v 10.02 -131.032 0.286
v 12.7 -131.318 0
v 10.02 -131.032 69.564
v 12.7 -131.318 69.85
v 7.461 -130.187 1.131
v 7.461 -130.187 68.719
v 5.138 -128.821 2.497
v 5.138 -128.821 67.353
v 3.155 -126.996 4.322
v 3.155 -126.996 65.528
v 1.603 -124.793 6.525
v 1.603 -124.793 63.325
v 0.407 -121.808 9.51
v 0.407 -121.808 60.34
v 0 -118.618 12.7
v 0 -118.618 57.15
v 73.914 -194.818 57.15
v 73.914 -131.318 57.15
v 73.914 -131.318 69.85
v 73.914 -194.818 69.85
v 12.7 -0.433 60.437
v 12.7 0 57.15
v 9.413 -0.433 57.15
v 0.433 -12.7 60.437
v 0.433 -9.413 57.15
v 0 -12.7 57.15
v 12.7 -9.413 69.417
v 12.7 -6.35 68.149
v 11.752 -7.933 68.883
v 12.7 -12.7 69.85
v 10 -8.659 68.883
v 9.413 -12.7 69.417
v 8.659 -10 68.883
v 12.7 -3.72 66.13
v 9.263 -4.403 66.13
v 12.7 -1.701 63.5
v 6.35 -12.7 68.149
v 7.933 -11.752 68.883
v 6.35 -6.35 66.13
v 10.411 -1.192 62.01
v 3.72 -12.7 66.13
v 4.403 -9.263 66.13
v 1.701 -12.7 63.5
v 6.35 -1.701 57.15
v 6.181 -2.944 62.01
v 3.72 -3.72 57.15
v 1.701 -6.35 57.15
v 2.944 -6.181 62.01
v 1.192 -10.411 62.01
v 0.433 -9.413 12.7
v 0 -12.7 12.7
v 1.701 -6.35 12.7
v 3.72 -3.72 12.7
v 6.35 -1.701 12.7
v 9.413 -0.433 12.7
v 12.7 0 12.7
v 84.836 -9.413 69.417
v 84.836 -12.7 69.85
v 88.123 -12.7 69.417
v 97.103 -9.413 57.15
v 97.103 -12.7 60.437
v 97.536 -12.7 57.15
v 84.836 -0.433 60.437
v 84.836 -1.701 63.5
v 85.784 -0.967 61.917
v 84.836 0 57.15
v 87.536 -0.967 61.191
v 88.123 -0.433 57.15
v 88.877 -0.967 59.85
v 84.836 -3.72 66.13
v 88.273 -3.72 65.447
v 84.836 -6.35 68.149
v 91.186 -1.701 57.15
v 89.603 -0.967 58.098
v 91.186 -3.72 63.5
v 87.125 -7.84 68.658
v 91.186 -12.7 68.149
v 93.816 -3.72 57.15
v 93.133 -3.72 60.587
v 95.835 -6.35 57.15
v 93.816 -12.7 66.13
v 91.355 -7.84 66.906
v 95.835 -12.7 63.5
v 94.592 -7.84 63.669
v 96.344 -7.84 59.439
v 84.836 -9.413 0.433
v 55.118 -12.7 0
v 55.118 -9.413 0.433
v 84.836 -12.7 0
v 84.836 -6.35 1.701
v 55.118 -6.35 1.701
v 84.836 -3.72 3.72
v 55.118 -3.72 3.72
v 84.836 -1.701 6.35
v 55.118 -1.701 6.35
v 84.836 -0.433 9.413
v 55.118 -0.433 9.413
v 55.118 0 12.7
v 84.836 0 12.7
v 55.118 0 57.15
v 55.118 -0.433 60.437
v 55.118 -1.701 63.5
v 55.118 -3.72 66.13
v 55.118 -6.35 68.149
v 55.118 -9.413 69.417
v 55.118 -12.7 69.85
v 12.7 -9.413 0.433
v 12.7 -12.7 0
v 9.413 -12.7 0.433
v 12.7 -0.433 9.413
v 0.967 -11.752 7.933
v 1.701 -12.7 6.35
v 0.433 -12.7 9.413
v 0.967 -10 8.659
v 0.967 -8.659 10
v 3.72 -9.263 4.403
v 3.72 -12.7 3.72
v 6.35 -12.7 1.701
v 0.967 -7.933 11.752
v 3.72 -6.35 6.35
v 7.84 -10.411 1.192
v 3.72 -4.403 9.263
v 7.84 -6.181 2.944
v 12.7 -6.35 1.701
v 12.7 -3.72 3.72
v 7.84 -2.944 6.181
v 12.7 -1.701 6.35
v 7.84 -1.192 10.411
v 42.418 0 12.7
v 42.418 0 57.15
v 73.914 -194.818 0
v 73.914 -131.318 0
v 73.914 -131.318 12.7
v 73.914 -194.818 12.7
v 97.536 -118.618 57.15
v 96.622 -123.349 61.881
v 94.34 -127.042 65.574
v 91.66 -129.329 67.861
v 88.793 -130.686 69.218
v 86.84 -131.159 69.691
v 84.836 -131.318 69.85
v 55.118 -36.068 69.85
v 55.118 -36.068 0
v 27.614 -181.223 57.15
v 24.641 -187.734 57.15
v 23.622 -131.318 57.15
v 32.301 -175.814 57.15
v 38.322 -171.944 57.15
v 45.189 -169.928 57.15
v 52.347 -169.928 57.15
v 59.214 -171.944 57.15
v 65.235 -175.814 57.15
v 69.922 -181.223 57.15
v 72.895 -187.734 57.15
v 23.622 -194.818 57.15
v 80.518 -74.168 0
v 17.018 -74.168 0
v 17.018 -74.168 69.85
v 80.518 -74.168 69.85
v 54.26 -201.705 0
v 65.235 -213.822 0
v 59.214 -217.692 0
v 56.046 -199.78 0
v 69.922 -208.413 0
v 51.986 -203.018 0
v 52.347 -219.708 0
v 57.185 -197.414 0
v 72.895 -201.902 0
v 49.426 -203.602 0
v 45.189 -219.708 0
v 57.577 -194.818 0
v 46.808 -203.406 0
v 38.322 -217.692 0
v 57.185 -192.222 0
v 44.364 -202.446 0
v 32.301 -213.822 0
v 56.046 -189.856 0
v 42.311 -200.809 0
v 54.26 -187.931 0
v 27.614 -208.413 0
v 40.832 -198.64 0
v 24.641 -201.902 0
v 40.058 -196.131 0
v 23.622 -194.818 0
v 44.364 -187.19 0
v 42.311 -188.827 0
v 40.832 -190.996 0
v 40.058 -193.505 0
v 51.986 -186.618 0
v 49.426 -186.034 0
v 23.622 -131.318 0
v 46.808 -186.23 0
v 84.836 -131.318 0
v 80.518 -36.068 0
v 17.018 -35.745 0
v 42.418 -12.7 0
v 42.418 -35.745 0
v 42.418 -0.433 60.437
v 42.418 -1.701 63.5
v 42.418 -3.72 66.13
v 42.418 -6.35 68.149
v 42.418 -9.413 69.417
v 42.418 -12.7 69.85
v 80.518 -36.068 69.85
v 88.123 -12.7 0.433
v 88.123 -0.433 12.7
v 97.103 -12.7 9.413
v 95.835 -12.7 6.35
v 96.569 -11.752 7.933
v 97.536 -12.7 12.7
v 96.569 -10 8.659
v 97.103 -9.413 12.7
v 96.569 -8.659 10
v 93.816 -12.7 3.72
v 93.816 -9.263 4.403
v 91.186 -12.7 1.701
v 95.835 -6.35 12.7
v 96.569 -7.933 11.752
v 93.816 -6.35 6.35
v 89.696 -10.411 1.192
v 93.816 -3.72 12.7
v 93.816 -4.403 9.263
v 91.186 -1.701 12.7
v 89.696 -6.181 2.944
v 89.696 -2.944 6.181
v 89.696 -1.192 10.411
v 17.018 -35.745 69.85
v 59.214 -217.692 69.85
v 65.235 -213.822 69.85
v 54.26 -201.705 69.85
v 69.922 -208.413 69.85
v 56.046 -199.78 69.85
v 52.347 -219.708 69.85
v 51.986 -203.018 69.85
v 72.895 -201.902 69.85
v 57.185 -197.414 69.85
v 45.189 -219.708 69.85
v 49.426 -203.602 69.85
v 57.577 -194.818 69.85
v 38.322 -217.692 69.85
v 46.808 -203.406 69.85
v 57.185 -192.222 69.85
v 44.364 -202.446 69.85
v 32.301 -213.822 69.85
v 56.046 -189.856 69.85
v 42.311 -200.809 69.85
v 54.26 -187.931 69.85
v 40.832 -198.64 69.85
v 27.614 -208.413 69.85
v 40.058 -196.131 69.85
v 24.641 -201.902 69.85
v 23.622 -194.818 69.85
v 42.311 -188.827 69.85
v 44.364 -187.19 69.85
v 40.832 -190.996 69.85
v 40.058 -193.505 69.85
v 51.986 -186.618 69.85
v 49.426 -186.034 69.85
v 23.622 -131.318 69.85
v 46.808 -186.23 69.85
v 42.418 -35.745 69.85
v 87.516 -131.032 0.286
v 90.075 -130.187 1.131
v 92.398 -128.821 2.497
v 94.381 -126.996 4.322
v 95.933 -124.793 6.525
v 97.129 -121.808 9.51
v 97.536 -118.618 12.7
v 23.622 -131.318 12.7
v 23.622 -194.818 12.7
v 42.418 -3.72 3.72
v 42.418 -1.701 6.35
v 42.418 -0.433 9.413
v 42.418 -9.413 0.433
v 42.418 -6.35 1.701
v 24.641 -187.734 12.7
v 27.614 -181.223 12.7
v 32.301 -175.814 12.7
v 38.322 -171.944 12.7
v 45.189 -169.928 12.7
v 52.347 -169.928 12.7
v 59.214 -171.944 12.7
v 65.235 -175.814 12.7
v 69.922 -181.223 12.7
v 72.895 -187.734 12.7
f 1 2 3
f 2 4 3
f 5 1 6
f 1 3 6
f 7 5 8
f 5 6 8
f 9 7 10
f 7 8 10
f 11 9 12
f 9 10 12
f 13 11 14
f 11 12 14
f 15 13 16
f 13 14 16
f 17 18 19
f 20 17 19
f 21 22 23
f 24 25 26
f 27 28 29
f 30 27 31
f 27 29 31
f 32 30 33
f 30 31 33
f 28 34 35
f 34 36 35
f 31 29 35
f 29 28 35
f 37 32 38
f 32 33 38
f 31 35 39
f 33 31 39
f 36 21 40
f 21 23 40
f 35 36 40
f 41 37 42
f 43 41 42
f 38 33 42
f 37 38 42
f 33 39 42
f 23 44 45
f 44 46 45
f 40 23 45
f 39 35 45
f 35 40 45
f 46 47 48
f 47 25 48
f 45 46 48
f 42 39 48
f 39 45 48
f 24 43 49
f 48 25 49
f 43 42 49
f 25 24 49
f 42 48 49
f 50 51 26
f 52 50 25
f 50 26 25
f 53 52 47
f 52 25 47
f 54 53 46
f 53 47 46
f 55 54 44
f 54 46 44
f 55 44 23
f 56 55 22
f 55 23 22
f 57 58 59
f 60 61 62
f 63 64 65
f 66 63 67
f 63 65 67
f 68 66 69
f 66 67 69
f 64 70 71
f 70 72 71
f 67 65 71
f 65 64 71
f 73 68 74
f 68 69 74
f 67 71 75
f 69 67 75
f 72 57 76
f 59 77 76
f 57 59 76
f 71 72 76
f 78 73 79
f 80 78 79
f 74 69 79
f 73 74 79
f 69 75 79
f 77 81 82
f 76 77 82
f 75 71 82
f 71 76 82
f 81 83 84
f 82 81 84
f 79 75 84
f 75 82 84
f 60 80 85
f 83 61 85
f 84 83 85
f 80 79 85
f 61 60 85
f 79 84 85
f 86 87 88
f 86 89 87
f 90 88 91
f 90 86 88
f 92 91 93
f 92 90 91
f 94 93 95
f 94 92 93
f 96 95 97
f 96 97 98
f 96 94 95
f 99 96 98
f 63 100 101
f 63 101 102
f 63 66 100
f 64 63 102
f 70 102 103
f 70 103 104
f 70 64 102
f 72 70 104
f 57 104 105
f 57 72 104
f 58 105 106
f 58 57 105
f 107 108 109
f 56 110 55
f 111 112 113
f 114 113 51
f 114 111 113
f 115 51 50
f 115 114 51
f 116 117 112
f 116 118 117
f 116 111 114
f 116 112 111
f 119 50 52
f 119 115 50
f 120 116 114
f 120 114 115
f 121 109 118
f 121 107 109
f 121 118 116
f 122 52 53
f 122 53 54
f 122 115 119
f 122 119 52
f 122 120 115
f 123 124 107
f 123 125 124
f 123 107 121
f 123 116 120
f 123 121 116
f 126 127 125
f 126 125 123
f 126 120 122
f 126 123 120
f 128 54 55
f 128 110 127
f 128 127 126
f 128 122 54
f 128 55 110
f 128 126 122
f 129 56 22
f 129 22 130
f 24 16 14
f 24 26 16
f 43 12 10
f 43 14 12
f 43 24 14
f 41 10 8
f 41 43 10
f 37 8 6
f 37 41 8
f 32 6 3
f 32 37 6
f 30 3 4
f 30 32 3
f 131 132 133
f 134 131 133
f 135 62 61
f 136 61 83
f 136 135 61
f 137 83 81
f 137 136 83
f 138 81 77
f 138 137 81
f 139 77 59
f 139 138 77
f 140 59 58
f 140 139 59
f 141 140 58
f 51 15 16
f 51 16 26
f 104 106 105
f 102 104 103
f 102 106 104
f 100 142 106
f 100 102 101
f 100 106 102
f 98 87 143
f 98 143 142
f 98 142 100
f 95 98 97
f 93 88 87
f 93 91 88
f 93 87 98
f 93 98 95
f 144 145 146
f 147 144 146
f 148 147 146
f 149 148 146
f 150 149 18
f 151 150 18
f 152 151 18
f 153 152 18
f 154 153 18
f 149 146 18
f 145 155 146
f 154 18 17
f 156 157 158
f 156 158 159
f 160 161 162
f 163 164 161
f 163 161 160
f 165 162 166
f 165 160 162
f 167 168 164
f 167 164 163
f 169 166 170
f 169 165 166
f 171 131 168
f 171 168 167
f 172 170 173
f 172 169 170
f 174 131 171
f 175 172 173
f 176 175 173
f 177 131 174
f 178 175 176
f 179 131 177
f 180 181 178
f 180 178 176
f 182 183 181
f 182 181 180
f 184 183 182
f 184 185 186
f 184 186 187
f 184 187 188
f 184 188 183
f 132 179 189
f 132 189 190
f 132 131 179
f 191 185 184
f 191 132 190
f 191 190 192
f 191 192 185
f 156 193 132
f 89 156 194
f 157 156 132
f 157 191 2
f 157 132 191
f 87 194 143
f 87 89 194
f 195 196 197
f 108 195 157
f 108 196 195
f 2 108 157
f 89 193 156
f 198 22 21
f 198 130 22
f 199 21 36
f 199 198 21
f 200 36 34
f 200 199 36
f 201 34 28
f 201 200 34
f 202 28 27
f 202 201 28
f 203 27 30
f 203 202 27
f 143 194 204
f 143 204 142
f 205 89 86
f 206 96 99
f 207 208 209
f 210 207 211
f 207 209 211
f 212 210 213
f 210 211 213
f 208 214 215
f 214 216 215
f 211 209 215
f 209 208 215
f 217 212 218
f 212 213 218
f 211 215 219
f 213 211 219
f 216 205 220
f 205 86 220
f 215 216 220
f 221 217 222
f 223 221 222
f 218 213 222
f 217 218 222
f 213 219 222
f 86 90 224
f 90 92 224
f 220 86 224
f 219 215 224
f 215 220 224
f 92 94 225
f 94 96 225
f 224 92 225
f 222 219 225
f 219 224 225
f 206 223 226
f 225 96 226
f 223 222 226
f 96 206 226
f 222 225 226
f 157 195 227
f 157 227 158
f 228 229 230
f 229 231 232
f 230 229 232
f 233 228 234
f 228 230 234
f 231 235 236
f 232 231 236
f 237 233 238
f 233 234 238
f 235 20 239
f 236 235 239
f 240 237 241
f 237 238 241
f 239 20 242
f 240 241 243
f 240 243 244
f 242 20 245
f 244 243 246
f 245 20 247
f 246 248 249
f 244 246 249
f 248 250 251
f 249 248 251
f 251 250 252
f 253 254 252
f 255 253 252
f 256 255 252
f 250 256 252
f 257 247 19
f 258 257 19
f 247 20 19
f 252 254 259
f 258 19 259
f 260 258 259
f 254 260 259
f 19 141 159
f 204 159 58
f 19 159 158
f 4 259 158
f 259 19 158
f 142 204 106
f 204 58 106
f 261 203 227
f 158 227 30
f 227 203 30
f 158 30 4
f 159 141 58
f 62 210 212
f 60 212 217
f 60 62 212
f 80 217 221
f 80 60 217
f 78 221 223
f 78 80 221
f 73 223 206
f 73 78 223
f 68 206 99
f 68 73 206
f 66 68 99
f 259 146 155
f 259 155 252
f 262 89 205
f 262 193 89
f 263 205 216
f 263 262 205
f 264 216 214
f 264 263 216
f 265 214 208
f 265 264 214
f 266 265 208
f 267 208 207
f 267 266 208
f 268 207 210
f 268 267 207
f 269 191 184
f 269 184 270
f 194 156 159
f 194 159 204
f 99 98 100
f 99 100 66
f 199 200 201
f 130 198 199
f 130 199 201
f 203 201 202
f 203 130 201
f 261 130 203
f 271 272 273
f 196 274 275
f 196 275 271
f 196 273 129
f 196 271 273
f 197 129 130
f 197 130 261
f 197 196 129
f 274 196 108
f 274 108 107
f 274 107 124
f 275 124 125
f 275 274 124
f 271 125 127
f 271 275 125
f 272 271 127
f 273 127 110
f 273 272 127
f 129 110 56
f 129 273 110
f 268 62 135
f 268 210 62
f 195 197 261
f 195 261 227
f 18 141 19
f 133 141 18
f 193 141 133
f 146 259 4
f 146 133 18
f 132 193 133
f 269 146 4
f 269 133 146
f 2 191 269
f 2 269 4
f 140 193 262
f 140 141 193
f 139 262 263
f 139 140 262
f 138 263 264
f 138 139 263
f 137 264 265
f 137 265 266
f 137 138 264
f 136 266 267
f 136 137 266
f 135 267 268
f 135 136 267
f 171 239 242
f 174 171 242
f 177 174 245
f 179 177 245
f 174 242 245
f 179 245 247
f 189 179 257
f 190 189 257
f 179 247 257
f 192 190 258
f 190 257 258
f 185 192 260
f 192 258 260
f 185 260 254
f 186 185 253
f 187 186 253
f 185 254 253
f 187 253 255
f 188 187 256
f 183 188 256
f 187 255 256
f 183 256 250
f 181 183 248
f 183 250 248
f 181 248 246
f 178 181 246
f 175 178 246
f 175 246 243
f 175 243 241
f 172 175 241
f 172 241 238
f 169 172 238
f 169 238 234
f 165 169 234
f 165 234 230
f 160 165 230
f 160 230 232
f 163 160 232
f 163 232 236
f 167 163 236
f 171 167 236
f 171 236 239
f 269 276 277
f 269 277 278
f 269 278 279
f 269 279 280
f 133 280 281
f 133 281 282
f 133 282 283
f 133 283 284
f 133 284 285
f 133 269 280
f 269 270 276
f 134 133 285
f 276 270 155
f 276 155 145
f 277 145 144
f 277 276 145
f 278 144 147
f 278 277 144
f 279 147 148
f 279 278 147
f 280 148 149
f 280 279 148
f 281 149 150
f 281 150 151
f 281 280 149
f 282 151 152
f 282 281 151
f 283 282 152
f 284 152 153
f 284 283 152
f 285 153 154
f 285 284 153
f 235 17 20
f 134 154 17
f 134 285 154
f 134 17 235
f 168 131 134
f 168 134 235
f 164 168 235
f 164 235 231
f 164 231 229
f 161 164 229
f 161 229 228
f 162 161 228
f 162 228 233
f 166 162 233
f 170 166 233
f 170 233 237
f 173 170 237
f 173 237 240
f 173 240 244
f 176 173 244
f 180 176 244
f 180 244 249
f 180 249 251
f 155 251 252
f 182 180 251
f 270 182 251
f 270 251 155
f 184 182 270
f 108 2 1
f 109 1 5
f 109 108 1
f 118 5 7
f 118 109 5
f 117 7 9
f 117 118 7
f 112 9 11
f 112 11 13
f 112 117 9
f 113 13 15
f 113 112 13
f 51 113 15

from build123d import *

# Parameters (mm, degrees)
BOSS_EXTRUDE1_DEPTH = 69.85
SKETCH2_W           = 50.292
SKETCH2_H           = 12.7
BOSS_EXTRUDE2_DEPTH = 63.5
SKETCH5_R           = 25.146
BOSS_EXTRUDE3_DEPTH = 69.85
SKETCH8_R           = 8.808520998
CUT_EXTRUDE2_DEPTH  = 251.552300113
FILLET7_R           = 12.7


with BuildPart() as part:
    # Sketch1 → Boss-Extrude1 (new body)
    with BuildSketch(Plane.XY):
        Polygon((0, 0), (42.418, 0), (42.418, -35.744914454), (17.018, -35.744914454), (17.018, -74.168), (80.518, -74.168), (80.518, -36.068), (55.118, -36.068), (55.118, 0), (97.536, 0), (97.536, -131.318), (0, -131.318), align=None)
    extrude(amount=BOSS_EXTRUDE1_DEPTH)

    # Sketch2 → Boss-Extrude2 (add)
    with BuildSketch(Plane.XZ.offset(131.318)):
        with Locations((48.768, 6.35)):
            Rectangle(SKETCH2_W, SKETCH2_H)
        with Locations((48.768, 63.5)):
            Rectangle(SKETCH2_W, SKETCH2_H)
    extrude(amount=BOSS_EXTRUDE2_DEPTH)

    # Sketch5 → Boss-Extrude3 (add)
    with BuildSketch(Plane(origin=(0, 0, 0), x_dir=(-1, 0, 0), z_dir=(0, 0, -1))):
        with Locations((-48.768, -194.818)):
            Circle(SKETCH5_R)
    extrude(amount=-BOSS_EXTRUDE3_DEPTH)

    # Sketch8 → Cut-Extrude2 (cut, through all)
    with BuildSketch(Plane.XY.offset(69.85)):
        with Locations((48.768, -194.818)):
            Circle(SKETCH8_R)
    extrude(amount=-CUT_EXTRUDE2_DEPTH, mode=Mode.SUBTRACT)

    # Fillet7
    fillet7_edges = [part.edges().sort_by_distance(p)[0] for p in [
        (21.209, 0, 0),
        (97.536, -65.659, 69.85),
        (76.327, 0, 0),
        (97.536, -65.659, 0),
        (0, -65.659, 0),
        (76.327, 0, 69.85),
        (0, 0, 34.925),
        (97.536, 0, 34.925),
        (97.536, -131.318, 34.925),
        (0, -131.318, 34.925),
        (21.209, 0, 69.85),
        (0, -65.659, 69.85),
    ]]
    fillet(fillet7_edges, radius=FILLET7_R)


solid = part.part
